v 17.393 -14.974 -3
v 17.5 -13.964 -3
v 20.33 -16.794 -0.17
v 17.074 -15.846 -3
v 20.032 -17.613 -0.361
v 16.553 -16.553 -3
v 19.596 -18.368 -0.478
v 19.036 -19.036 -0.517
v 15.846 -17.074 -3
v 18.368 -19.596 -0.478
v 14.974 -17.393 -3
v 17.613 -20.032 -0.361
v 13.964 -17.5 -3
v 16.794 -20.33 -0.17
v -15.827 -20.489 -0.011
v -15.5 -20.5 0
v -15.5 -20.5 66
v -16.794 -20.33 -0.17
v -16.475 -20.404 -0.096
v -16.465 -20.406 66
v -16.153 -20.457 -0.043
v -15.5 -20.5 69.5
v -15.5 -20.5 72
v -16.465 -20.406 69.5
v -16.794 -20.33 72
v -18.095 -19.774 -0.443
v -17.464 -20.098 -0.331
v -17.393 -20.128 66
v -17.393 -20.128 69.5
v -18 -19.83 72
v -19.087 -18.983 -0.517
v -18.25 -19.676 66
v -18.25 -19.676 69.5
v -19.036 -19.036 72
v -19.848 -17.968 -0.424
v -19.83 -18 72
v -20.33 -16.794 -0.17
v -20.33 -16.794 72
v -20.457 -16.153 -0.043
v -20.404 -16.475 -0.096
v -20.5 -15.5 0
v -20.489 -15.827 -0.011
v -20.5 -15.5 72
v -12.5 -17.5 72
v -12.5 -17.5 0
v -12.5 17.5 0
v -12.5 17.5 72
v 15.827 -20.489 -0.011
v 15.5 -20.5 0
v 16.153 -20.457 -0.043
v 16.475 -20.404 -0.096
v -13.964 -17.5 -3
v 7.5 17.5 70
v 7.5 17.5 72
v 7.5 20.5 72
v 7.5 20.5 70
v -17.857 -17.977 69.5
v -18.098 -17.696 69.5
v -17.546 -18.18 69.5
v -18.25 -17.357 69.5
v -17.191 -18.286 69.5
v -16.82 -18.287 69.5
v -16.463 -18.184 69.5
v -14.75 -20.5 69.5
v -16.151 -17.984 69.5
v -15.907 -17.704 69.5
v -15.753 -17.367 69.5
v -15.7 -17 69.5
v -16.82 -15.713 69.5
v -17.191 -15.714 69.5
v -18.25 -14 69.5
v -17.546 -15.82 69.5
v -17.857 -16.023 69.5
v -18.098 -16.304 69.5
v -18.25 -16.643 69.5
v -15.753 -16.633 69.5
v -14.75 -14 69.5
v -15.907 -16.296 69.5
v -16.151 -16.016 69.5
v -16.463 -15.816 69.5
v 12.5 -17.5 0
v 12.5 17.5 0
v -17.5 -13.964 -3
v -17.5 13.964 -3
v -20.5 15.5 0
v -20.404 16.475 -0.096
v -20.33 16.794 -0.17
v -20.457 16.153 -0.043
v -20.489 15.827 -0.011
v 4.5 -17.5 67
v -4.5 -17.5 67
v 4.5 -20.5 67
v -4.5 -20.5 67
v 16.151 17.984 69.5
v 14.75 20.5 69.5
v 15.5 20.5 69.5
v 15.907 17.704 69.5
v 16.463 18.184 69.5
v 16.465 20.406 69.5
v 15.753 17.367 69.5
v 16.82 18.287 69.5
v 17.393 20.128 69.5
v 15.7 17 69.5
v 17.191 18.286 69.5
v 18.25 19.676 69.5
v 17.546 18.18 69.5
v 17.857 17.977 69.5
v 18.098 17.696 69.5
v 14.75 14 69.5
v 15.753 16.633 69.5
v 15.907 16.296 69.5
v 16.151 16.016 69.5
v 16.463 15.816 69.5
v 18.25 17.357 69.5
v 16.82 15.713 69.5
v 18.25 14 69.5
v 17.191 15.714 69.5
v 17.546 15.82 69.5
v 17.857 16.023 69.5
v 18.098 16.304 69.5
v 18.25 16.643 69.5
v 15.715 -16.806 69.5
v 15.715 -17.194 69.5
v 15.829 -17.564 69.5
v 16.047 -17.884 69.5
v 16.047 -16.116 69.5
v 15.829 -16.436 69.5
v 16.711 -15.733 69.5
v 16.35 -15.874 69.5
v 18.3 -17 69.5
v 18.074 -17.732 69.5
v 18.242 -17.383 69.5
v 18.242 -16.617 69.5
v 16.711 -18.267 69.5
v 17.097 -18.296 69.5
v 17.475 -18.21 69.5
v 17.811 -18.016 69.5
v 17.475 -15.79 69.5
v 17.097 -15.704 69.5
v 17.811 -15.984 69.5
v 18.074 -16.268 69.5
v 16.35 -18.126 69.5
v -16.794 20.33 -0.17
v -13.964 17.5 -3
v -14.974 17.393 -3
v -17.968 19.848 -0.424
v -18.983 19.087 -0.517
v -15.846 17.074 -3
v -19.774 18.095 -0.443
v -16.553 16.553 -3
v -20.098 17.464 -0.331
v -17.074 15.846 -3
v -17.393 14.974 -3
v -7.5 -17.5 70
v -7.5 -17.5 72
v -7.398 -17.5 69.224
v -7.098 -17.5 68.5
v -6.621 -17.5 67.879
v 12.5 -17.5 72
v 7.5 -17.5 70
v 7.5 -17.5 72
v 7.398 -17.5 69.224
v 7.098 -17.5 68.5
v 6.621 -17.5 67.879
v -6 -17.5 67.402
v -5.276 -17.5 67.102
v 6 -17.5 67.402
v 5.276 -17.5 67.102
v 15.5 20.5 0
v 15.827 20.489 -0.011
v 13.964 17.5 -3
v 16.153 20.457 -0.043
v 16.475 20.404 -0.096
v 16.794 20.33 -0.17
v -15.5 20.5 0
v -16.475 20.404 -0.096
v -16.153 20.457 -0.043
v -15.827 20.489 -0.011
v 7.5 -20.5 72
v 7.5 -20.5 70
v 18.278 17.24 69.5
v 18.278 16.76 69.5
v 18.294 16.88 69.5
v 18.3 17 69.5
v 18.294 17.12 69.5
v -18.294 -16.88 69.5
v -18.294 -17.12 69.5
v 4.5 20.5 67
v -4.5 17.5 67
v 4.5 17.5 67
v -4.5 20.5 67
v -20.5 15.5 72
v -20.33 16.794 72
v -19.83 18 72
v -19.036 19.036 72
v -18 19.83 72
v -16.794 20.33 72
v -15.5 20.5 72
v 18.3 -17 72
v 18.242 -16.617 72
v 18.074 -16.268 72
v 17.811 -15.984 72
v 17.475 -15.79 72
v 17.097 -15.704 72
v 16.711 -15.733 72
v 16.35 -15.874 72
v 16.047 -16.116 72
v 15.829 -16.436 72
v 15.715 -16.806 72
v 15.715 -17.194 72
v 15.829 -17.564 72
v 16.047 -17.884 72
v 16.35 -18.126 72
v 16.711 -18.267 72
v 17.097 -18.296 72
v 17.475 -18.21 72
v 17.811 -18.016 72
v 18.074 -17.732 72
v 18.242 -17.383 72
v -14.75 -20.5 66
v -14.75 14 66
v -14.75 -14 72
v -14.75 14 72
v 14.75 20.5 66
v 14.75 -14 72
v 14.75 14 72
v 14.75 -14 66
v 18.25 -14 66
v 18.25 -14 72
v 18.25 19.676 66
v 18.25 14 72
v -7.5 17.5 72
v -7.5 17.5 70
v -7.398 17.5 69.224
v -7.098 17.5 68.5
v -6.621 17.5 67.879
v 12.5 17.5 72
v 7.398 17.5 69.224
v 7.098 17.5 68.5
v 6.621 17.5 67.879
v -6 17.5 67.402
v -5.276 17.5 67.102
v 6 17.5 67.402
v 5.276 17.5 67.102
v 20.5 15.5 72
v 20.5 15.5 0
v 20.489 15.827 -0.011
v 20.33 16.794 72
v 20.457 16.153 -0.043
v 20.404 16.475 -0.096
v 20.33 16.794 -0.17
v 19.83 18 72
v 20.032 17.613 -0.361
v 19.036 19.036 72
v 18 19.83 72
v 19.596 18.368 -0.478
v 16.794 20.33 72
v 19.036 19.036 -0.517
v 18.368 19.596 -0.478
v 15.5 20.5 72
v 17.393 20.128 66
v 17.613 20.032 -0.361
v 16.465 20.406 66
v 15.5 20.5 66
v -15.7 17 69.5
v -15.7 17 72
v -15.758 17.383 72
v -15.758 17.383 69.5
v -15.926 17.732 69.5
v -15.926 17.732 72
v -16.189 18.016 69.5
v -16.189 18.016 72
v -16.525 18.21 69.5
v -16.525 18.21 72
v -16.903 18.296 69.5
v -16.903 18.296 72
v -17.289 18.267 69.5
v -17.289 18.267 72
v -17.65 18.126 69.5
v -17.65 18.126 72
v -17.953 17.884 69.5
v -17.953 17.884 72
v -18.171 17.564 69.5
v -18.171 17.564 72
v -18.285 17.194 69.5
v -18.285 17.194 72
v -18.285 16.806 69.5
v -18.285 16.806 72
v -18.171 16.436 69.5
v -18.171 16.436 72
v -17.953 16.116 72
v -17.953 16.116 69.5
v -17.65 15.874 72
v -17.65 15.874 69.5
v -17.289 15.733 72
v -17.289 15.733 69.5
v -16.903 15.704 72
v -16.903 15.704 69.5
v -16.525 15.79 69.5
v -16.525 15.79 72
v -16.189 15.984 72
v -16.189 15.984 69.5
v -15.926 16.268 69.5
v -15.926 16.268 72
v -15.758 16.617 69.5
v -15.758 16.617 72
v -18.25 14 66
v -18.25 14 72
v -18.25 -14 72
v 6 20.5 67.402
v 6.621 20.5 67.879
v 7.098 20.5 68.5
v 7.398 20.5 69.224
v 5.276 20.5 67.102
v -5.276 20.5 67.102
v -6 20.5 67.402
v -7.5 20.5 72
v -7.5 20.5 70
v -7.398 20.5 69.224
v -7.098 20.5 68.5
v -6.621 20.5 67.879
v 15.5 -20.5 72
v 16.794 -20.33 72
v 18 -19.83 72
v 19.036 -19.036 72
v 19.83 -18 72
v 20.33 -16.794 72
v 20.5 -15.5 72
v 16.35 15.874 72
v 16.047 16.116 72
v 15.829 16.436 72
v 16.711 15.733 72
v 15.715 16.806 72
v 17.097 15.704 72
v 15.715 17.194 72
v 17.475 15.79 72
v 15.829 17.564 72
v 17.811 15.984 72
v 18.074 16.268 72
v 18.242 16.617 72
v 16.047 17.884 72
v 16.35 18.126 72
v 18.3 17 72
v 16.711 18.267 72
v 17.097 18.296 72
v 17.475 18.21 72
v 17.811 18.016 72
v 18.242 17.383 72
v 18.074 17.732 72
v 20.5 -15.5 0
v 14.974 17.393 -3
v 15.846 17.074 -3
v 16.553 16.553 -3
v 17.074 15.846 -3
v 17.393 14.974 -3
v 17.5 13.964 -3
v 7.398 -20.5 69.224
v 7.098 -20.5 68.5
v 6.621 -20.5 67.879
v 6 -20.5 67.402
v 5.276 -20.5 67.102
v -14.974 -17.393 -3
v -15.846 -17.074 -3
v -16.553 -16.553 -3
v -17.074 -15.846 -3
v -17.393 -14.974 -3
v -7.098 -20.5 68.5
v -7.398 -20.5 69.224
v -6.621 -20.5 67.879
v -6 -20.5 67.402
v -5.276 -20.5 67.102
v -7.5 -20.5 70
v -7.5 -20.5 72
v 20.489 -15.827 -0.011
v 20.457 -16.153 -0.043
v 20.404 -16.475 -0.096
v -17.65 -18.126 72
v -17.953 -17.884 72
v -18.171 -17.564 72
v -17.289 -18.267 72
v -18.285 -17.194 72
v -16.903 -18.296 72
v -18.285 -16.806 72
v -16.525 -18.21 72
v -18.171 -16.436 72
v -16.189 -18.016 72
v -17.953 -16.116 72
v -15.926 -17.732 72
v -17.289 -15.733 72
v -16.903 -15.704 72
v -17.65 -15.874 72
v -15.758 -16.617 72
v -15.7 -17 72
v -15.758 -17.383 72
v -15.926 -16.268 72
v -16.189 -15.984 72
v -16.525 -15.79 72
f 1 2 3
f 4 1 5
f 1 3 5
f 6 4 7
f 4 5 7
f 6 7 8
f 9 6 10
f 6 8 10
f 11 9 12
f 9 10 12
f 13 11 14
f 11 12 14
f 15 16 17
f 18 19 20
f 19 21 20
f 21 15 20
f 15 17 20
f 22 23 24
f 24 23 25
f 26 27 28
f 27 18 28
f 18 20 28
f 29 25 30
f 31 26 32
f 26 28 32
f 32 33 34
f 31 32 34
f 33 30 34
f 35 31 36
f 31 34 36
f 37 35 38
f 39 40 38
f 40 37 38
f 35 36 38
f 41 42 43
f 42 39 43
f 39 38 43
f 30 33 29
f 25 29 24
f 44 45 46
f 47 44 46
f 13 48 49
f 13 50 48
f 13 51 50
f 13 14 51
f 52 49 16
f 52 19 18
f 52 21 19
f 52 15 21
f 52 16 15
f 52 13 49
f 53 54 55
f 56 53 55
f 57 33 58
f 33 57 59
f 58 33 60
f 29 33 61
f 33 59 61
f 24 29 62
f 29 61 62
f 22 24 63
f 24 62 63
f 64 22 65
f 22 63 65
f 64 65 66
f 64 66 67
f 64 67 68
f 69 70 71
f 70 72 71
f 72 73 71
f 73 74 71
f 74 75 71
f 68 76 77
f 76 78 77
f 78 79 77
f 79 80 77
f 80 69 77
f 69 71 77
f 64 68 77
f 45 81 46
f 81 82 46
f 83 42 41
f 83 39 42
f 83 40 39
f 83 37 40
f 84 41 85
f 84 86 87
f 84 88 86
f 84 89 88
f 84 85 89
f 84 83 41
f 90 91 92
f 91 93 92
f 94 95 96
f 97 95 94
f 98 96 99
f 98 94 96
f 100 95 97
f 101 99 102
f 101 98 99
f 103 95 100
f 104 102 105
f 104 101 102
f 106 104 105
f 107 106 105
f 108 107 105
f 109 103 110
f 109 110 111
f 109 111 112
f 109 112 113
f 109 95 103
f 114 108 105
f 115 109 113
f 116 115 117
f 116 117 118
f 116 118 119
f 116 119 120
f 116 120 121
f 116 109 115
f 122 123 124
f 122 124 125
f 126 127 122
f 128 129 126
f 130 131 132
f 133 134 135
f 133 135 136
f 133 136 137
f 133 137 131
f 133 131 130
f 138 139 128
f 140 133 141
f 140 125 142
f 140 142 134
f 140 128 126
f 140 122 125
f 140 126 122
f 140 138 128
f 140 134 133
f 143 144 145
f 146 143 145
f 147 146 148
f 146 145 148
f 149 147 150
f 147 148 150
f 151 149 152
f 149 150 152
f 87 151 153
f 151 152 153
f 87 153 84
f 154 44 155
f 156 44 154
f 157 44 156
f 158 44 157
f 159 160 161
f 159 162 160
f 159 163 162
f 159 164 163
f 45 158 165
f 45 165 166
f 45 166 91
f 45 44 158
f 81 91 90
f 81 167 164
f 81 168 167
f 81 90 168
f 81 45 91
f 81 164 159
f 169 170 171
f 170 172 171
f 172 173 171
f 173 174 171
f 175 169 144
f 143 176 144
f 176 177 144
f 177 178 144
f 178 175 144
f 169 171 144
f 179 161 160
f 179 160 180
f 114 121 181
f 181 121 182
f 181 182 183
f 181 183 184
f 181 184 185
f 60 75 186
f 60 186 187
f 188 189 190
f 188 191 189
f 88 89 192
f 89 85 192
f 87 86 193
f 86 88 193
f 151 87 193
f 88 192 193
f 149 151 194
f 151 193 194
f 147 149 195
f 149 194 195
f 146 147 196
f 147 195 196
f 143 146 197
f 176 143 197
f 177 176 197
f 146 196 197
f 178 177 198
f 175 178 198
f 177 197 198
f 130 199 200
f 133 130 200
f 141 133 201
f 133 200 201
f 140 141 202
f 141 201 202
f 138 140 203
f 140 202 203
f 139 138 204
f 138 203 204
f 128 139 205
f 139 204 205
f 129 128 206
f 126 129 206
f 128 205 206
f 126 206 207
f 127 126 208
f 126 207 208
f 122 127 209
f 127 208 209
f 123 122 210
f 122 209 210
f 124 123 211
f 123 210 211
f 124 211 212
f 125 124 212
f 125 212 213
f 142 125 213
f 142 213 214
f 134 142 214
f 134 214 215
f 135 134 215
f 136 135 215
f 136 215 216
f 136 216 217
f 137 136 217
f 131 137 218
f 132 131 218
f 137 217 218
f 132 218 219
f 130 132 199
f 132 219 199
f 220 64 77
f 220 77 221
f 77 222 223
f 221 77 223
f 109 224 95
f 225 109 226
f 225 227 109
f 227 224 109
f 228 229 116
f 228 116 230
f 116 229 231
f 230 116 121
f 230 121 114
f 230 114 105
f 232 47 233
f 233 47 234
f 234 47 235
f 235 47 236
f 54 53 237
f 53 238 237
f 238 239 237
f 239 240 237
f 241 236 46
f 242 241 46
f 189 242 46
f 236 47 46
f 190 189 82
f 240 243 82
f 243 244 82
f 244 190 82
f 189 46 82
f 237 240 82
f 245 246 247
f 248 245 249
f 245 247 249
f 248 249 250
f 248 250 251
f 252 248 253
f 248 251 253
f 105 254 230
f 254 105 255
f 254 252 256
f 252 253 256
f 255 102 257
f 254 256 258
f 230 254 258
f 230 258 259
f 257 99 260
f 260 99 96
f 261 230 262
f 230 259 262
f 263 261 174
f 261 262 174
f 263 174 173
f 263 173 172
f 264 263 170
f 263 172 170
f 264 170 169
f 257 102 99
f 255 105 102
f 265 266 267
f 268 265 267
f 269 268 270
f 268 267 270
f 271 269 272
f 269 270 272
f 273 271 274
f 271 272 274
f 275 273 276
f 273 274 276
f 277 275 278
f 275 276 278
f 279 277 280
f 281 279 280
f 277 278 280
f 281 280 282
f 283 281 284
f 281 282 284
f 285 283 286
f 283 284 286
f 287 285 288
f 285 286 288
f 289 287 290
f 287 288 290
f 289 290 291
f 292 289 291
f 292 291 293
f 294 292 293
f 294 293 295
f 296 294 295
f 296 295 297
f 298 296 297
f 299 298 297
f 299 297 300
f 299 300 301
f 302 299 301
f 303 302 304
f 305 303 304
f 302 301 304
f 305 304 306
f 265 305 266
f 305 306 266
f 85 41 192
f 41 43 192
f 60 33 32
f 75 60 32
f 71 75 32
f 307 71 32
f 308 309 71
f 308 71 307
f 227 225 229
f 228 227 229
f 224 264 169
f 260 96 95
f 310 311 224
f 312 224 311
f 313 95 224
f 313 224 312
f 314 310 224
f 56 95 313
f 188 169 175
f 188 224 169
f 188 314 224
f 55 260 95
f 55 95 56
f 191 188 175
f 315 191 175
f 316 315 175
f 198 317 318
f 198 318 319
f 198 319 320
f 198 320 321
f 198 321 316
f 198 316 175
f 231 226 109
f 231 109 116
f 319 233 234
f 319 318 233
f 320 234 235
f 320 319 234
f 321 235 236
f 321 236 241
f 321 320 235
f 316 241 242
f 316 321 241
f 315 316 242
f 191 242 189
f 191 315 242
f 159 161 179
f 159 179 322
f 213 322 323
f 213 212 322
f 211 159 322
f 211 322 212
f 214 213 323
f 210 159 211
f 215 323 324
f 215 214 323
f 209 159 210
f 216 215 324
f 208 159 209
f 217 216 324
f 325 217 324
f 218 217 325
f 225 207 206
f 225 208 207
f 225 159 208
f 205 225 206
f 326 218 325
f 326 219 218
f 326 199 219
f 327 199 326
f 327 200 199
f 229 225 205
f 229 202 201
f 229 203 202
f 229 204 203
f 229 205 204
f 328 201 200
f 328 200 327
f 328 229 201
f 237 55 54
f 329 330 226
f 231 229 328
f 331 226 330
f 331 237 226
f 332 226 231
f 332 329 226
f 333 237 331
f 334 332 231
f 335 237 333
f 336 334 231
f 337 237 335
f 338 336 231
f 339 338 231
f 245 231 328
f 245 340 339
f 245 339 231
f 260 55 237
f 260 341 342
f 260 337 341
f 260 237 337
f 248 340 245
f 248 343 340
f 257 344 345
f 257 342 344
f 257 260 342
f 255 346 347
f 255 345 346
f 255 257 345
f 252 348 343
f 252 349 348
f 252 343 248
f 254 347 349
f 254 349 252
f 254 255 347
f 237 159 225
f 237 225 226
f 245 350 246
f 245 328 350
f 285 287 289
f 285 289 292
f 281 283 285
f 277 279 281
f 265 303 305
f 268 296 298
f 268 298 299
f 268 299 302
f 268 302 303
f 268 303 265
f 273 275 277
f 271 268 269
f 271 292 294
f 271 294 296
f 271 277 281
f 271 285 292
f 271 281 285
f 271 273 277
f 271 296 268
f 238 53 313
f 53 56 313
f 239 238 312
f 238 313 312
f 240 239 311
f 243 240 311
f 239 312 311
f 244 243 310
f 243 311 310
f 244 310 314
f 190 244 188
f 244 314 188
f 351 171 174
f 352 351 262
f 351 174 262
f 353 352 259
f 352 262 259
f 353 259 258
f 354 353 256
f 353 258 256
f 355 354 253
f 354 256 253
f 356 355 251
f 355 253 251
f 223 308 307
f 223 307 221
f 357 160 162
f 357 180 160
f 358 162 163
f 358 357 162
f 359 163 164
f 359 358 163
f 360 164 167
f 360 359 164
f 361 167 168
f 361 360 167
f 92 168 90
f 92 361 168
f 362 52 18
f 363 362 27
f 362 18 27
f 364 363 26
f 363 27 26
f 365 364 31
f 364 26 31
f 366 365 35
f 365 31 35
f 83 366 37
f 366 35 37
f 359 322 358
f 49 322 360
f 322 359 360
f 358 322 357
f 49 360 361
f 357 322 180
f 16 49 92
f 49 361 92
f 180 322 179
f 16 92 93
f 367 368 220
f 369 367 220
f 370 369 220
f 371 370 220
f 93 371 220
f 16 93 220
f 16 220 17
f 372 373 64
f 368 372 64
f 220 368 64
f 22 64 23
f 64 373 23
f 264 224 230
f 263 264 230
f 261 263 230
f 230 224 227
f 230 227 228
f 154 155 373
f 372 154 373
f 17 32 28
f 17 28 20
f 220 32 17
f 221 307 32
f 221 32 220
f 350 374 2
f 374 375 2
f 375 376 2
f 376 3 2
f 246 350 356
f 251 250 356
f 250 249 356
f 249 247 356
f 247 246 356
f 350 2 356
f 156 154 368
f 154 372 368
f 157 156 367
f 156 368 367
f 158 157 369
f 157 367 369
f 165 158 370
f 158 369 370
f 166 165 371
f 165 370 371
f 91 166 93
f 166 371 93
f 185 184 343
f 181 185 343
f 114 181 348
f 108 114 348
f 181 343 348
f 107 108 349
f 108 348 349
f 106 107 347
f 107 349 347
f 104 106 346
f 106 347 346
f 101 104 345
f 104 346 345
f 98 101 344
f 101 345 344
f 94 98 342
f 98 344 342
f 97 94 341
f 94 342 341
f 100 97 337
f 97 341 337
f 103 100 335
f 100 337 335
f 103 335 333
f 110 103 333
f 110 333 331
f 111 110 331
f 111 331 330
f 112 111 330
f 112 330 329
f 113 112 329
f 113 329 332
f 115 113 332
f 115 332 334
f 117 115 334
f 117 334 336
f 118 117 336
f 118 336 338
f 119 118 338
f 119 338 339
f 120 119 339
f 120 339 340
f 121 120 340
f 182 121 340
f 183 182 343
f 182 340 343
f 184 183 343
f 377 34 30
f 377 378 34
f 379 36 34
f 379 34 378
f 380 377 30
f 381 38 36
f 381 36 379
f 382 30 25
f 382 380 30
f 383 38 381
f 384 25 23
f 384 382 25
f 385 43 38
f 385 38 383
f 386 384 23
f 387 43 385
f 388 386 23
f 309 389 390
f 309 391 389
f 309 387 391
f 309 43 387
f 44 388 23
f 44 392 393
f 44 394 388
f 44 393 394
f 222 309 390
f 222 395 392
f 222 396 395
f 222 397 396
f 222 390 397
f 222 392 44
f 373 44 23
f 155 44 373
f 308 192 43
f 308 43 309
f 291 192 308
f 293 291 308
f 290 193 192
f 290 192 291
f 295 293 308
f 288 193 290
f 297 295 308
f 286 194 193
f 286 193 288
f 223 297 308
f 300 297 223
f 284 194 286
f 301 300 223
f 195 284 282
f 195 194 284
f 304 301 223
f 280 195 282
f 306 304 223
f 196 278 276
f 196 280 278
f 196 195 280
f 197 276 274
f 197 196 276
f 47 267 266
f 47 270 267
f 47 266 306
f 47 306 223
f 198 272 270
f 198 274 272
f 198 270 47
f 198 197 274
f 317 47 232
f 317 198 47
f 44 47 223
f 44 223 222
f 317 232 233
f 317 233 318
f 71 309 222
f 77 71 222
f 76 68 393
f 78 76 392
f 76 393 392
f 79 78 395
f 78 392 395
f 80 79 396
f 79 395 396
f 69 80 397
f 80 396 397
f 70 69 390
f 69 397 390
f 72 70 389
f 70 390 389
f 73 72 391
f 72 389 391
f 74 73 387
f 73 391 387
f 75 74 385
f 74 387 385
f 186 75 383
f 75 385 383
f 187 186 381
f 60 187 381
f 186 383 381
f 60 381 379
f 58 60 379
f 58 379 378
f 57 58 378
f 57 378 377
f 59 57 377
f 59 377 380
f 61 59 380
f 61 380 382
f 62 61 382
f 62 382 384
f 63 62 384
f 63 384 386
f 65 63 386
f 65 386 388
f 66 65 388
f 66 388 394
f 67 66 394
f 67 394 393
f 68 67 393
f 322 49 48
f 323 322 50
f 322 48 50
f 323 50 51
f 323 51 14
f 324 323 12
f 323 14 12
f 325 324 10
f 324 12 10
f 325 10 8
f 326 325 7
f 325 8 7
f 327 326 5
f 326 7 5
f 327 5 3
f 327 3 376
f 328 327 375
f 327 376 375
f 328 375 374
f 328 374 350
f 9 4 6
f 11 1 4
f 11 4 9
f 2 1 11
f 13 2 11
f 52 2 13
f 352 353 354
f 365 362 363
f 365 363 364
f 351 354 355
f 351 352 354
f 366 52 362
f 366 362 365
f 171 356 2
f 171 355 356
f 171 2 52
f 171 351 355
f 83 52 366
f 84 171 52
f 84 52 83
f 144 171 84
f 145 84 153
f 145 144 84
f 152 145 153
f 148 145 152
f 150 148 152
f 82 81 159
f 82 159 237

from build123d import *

# Parameters (mm, degrees)
SKETCH_1_W             = 41
SKETCH_1_H             = 41
SKETCH_1_W_2           = 25
SKETCH_1_H_2           = 35
EXTRUDE_1_DEPTH        = 72
SKETCH_2_W             = 41
SKETCH_2_H             = 41
EXTRUDE_2_DEPTH        = 3
CHAMFER_1_SIZE         = 3
FILLET_1_R             = 5
SKETCH_3_W             = 15
SKETCH_3_H             = 3
CUT_EXTRUDE_1_DEPTH    = 5
FILLET_2_R             = 3
SKETCH_4_W             = 3.5
SKETCH_4_H             = 28
CUT_EXTRUDE_2_DEPTH    = 6
SKETCH_6_W             = 3.5
SKETCH_6_H             = 3.5
CUT_EXTRUDE_4_DEPTH    = 83.428757118
SKETCH_7_W             = 3.5
SKETCH_7_H             = 3.5
CUT_EXTRUDE_5_DEPTH    = 83.428757118
FILLET_2_OF_MIRROR_1_R = 3
SKETCH_8_R             = 1.3
CUT_EXTRUDE_6_DEPTH    = 2.5


with BuildPart() as part:
    # ｽｹｯﾁ1 → ﾎﾞｽ - 押し出し1 (new body)
    with BuildSketch(Plane.XY):
        Rectangle(SKETCH_1_W, SKETCH_1_H)
        Rectangle(SKETCH_1_W_2, SKETCH_1_H_2, mode=Mode.SUBTRACT)
    extrude(amount=EXTRUDE_1_DEPTH)

    # ｽｹｯﾁ2 → ﾎﾞｽ - 押し出し2 (add)
    with BuildSketch(Plane(origin=(0, 0, 0), x_dir=(-1, 0, 0), z_dir=(0, 0, -1))):
        Rectangle(SKETCH_2_W, SKETCH_2_H)
    extrude(amount=EXTRUDE_2_DEPTH)

    # 面取り1
    chamfer_1_edges = [part.edges().sort_by_distance(p)[0] for p in [
        (20.5, 0, -3),
        (0, -20.5, -3),
        (-20.5, 0, -3),
        (0, 20.5, -3),
    ]]
    chamfer(chamfer_1_edges, length=CHAMFER_1_SIZE)

    # ﾌｨﾚｯﾄ1
    # the kernel refuses this fillet: 5 mm, written as the material it takes off along each edge
    with BuildSketch(Plane(origin=(-20.5, 20.5, 84.5), x_dir=(0, -1, 0), z_dir=(0, 0, -1)), Plane(origin=(20.5, 20.5, -12.5), x_dir=(0, -1, 0), z_dir=(0, 0, 1)), Plane(origin=(20.5, -20.5, -12.5), x_dir=(-1, 0, 0), z_dir=(0, 0, 1)), Plane(origin=(-20.5, -20.5, 84.5), x_dir=(1, 0, 0), z_dir=(0, 0, -1))) as fillet_1_piece_1:
        with BuildLine():
            CenterArc((FILLET_1_R, -FILLET_1_R), FILLET_1_R, 90, 90)
            Line((0, -FILLET_1_R), (0, 0))
            Line((0, 0), (FILLET_1_R, 0))
        make_face()
    extrude(amount=97, mode=Mode.SUBTRACT)
    with BuildSketch(Plane(origin=(-24.666666667, -24.666666667, 4.166666667), x_dir=(0.816496580927726, -0.40824829046386285, 0.4082482904638632), z_dir=(0.5773502691896258, 0.5773502691896258, -0.5773502691896258))) as fillet_1_piece_2:
        with BuildLine():
            CenterArc((FILLET_1_R * 0.57735026919, -FILLET_1_R), FILLET_1_R, 90, 60)
            Line((-FILLET_1_R * 0.288675134595, -FILLET_1_R * 0.5), (0, 0))
            Line((0, 0), (FILLET_1_R * 0.57735026919, 0))
        make_face()
    extrude(amount=19.629909152, mode=Mode.SUBTRACT)
    with BuildSketch(Plane(origin=(24.666666667, -24.666666667, 4.166666667), x_dir=(-0.816496580927726, -0.40824829046386285, 0.4082482904638632), z_dir=(-0.5773502691896258, 0.5773502691896258, -0.5773502691896258)), Plane(origin=(-13.333333333, 13.333333333, -7.166666667), x_dir=(-0.40824829046386285, -0.816496580927726, 0.4082482904638632), z_dir=(-0.5773502691896258, 0.5773502691896258, 0.5773502691896258)), Plane(origin=(24.666666667, 24.666666667, 4.166666667), x_dir=(0.40824829046386285, -0.816496580927726, 0.4082482904638632), z_dir=(-0.5773502691896258, -0.5773502691896258, -0.5773502691896258))) as fillet_1_piece_3:
        with BuildLine():
            CenterArc((FILLET_1_R * 0.57735026919, FILLET_1_R), FILLET_1_R, 210, 60)
            Line((-FILLET_1_R * 0.288675134595, FILLET_1_R * 0.5), (0, 0))
            Line((0, 0), (FILLET_1_R * 0.57735026919, 0))
        make_face()
    extrude(amount=19.629909152, mode=Mode.SUBTRACT)

    # ｽｹｯﾁ3 → ｶｯﾄ - 押し出し1 (cut)
    with BuildSketch(Plane.XY.offset(72)):
        with Locations((0, 19)):
            Rectangle(SKETCH_3_W, SKETCH_3_H)
    cut_extrude_1 = extrude(amount=-CUT_EXTRUDE_1_DEPTH, mode=Mode.SUBTRACT)

    # ﾌｨﾚｯﾄ2
    fillet_2_edges = [part.edges().sort_by_distance(p)[0] for p in [
        (-7.5, 19, 67),
        (7.5, 19, 67),
    ]]
    fillet(fillet_2_edges, radius=FILLET_2_R)

    # ｽｹｯﾁ4 → ｶｯﾄ - 押し出し2 (cut)
    with BuildSketch(Plane.XY.offset(72)):
        with Locations((-16.5, 0)):
            Rectangle(SKETCH_4_W, SKETCH_4_H)
        with Locations((16.5, 0)):
            Rectangle(SKETCH_4_W, SKETCH_4_H)
    extrude(amount=-CUT_EXTRUDE_2_DEPTH, mode=Mode.SUBTRACT)

    # ｽｹｯﾁ6 → ｶｯﾄ - 押し出し4 (cut, through all)
    with BuildSketch(Plane.XZ.offset(-14)):
        with Locations((16.5, 67.75)):
            Rectangle(SKETCH_6_W, SKETCH_6_H)
    extrude(amount=-CUT_EXTRUDE_4_DEPTH, mode=Mode.SUBTRACT)

    # ｽｹｯﾁ7 → ｶｯﾄ - 押し出し5 (cut, through all)
    with BuildSketch(Plane(origin=(0, -14, 0), x_dir=(1, 0, 0), z_dir=(0, 1, 0))):
        with Locations((-16.5, -67.75)):
            Rectangle(SKETCH_7_W, SKETCH_7_H)
    extrude(amount=-CUT_EXTRUDE_5_DEPTH, mode=Mode.SUBTRACT)

    # ﾐﾗｰ1: ｶｯﾄ - 押し出し1 across plane
    add(cut_extrude_1.mirror(Plane.ZX), mode=Mode.SUBTRACT)

    # ﾌｨﾚｯﾄ2 of ﾐﾗｰ1
    fillet_2_of_mirror_1_edges = [part.edges().sort_by_distance(p)[0] for p in [
        (-7.5, -19, 67),
        (7.5, -19, 67),
    ]]
    fillet(fillet_2_of_mirror_1_edges, radius=FILLET_2_OF_MIRROR_1_R)

    # ｽｹｯﾁ8 → ｶｯﾄ - 押し出し6 (cut)
    with BuildSketch(Plane.XY.offset(72)):
        with Locations((17, 17)):
            Circle(SKETCH_8_R)
        with Locations((17, -17)):
            Circle(SKETCH_8_R)
        with Locations((-17, -17)):
            Circle(SKETCH_8_R)
        with Locations((-17, 17)):
            Circle(SKETCH_8_R)
    extrude(amount=-CUT_EXTRUDE_6_DEPTH, mode=Mode.SUBTRACT)


solid = part.part
